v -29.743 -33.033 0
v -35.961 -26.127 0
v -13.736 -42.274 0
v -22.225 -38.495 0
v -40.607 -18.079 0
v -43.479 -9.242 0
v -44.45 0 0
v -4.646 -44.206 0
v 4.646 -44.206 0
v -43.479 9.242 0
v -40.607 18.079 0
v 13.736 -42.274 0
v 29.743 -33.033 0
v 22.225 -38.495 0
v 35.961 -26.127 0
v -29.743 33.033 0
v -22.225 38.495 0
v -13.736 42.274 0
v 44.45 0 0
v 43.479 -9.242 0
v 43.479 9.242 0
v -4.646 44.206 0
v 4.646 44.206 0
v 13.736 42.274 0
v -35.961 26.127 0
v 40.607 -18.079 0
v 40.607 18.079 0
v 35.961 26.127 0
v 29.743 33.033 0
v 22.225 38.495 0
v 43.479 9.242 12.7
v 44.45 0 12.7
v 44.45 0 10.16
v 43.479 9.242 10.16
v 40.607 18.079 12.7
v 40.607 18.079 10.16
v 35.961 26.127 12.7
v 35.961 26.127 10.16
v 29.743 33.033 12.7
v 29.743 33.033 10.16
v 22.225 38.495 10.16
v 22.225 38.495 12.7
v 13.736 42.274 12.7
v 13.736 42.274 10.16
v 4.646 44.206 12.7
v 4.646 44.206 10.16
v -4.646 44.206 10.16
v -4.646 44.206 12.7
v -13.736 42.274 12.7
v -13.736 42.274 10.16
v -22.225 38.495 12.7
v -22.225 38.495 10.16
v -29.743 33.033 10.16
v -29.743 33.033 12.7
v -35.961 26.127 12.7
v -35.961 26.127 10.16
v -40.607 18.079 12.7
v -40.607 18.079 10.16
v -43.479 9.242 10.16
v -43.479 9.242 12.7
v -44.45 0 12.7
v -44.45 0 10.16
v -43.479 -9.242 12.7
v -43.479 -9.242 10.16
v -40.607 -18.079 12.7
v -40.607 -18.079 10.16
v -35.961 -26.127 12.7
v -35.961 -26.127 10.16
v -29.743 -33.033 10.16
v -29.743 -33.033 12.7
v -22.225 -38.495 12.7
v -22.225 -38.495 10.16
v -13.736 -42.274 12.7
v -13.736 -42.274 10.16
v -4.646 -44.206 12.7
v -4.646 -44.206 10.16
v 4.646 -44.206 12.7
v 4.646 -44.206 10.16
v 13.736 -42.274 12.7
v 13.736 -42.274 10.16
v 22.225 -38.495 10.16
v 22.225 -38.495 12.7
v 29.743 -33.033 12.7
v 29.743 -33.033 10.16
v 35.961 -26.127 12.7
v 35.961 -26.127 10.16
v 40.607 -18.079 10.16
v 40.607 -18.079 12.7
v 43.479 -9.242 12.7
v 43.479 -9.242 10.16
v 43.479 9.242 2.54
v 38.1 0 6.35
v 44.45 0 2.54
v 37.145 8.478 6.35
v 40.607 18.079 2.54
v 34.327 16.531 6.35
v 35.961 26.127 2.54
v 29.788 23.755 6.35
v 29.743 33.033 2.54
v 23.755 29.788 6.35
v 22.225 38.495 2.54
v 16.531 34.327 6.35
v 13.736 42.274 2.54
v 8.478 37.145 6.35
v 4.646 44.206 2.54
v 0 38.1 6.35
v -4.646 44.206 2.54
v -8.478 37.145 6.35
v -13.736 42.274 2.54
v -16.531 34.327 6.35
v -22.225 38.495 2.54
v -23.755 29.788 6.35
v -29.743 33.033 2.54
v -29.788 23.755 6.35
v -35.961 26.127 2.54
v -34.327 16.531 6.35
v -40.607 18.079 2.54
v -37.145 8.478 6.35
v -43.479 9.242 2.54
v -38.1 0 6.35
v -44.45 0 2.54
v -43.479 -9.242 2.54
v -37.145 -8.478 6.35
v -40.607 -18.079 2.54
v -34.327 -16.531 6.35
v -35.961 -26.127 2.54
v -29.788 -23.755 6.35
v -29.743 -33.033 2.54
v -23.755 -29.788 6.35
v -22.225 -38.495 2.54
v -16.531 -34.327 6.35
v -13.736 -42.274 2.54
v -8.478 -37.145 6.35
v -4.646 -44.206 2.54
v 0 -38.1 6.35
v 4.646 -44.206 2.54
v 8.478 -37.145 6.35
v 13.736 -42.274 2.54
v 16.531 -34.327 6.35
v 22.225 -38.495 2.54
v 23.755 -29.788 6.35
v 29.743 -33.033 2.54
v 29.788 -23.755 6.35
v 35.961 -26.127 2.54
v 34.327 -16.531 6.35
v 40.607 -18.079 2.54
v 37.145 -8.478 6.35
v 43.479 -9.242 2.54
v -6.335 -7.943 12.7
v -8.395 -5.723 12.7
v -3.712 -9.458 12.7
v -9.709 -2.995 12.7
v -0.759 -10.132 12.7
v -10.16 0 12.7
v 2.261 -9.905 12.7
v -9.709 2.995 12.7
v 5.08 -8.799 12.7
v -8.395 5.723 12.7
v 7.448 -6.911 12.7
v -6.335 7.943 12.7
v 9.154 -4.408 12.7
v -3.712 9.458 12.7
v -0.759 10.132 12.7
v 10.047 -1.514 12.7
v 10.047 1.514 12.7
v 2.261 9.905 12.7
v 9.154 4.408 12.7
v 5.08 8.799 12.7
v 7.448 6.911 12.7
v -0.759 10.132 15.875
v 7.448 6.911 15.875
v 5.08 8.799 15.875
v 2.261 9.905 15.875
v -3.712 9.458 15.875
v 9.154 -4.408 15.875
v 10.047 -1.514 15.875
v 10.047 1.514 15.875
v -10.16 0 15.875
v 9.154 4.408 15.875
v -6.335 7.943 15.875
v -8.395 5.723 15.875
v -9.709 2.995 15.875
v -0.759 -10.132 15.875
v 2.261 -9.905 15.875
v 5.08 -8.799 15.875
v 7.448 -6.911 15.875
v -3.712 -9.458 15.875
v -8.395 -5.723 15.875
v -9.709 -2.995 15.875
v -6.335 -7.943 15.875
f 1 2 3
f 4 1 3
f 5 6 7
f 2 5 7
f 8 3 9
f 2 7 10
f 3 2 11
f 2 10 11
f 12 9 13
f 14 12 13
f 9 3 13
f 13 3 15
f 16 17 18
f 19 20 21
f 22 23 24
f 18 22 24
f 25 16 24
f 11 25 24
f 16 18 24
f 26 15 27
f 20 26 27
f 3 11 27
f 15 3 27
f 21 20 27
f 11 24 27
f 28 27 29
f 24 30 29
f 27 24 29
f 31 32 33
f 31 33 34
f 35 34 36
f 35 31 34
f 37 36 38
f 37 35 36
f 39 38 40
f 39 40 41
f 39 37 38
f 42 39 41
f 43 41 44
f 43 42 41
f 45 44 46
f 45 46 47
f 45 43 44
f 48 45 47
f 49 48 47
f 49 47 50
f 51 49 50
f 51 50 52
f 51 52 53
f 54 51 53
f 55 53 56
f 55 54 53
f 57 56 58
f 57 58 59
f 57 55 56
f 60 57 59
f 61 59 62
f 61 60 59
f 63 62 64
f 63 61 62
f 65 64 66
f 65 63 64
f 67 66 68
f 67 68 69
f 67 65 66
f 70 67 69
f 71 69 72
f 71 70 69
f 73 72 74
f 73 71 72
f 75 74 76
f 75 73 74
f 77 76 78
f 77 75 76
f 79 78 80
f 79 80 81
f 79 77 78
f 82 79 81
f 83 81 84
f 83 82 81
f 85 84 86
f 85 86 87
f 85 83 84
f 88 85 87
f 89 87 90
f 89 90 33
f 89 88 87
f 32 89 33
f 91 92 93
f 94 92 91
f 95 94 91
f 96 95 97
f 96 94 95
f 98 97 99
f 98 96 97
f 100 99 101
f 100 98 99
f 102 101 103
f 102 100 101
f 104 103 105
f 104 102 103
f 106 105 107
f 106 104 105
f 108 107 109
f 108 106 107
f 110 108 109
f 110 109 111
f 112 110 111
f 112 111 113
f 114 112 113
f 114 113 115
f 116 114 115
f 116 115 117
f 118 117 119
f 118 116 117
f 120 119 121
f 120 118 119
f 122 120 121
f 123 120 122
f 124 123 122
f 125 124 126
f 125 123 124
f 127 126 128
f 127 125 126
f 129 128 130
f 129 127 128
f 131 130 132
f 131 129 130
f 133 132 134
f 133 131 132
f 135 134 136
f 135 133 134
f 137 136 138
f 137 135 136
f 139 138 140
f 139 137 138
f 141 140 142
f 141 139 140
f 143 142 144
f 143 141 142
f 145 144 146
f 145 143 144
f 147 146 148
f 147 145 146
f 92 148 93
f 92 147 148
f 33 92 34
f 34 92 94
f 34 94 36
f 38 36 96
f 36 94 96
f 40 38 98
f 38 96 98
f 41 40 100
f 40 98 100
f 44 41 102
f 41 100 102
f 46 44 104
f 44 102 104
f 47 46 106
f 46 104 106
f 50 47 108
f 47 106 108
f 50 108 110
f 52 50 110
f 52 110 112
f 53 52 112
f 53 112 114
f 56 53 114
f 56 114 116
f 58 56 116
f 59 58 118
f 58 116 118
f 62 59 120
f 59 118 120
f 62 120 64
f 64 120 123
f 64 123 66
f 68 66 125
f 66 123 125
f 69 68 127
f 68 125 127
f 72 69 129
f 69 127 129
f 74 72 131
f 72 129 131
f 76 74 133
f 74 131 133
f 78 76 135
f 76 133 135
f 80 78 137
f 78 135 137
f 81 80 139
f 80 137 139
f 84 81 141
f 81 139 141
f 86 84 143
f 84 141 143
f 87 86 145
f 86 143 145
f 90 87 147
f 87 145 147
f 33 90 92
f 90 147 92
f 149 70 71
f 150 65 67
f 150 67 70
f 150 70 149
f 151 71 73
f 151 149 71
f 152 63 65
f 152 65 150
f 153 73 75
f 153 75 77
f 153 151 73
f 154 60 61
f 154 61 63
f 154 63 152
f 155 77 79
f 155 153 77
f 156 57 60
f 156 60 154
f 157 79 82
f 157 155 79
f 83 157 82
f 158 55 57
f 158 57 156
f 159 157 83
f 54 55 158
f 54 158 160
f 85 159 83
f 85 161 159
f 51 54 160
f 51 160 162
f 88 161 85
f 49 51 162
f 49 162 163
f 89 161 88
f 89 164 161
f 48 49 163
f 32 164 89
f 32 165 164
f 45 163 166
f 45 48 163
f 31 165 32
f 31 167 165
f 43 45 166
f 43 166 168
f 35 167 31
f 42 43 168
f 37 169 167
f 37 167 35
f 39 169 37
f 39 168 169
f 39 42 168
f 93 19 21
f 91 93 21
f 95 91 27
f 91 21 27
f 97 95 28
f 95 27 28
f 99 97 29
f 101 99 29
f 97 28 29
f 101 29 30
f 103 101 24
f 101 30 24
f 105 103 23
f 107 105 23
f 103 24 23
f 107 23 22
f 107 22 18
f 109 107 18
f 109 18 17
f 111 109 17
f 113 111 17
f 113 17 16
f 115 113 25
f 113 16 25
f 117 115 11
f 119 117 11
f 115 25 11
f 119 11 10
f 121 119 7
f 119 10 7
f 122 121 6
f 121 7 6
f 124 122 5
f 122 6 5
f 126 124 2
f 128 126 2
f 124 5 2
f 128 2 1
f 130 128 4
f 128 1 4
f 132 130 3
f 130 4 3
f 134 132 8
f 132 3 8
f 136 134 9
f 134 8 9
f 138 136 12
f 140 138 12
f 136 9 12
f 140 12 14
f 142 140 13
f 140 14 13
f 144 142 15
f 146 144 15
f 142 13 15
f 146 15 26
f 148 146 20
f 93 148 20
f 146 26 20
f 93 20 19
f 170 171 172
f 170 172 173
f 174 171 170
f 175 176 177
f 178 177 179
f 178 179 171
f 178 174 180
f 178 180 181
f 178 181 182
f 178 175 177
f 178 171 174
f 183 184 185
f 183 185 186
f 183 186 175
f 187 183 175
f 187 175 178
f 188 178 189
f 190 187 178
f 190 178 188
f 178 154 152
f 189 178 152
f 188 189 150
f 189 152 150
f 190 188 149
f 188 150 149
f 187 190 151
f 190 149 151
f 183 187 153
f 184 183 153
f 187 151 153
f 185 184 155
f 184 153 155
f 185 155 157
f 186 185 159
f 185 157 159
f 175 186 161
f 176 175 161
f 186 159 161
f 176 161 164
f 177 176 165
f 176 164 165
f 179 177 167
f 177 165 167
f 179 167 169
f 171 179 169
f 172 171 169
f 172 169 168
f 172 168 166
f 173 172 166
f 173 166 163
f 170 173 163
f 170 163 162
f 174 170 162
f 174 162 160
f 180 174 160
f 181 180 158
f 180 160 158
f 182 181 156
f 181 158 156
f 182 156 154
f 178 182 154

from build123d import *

# Parameters (mm, degrees)
SKETCH1_R           = 44.45
BOSS_EXTRUDE1_DEPTH = 2.54
SKETCH2_R           = 38.1
SKETCH3_R           = 10.16
BOSS_EXTRUDE2_DEPTH = 3.175


with BuildPart() as part:
    # Sketch1 → Boss-Extrude1 (new body)
    with BuildSketch(Plane.XY):
        Circle(SKETCH1_R)
    extrude(amount=BOSS_EXTRUDE1_DEPTH)

    # Sketch2 → section 1 of loft1
    with BuildSketch(Plane.XY.offset(6.35), mode=Mode.PRIVATE) as loft1_s1:
        Circle(SKETCH2_R)
    # loft up to a face of the part (loft1)
    loft([Face(Wire([part.edges().sort_by_distance((-30.428118859, 32.402655489, 2.54))[0]])), loft1_s1.sketch])

    # Mirror3: part across plane


with BuildPart() as part_1:
    add(part.part)
    add(part.part.mirror(Plane.XY.offset(6.35)))

    # Sketch3 → Boss-Extrude2 (add)
    with BuildSketch(Plane.XY.offset(12.7)):
        with Locations(Location((0, 0, 0), (0, 0, 180))):
            Circle(SKETCH3_R)
    extrude(amount=BOSS_EXTRUDE2_DEPTH)


solid = part_1.part
